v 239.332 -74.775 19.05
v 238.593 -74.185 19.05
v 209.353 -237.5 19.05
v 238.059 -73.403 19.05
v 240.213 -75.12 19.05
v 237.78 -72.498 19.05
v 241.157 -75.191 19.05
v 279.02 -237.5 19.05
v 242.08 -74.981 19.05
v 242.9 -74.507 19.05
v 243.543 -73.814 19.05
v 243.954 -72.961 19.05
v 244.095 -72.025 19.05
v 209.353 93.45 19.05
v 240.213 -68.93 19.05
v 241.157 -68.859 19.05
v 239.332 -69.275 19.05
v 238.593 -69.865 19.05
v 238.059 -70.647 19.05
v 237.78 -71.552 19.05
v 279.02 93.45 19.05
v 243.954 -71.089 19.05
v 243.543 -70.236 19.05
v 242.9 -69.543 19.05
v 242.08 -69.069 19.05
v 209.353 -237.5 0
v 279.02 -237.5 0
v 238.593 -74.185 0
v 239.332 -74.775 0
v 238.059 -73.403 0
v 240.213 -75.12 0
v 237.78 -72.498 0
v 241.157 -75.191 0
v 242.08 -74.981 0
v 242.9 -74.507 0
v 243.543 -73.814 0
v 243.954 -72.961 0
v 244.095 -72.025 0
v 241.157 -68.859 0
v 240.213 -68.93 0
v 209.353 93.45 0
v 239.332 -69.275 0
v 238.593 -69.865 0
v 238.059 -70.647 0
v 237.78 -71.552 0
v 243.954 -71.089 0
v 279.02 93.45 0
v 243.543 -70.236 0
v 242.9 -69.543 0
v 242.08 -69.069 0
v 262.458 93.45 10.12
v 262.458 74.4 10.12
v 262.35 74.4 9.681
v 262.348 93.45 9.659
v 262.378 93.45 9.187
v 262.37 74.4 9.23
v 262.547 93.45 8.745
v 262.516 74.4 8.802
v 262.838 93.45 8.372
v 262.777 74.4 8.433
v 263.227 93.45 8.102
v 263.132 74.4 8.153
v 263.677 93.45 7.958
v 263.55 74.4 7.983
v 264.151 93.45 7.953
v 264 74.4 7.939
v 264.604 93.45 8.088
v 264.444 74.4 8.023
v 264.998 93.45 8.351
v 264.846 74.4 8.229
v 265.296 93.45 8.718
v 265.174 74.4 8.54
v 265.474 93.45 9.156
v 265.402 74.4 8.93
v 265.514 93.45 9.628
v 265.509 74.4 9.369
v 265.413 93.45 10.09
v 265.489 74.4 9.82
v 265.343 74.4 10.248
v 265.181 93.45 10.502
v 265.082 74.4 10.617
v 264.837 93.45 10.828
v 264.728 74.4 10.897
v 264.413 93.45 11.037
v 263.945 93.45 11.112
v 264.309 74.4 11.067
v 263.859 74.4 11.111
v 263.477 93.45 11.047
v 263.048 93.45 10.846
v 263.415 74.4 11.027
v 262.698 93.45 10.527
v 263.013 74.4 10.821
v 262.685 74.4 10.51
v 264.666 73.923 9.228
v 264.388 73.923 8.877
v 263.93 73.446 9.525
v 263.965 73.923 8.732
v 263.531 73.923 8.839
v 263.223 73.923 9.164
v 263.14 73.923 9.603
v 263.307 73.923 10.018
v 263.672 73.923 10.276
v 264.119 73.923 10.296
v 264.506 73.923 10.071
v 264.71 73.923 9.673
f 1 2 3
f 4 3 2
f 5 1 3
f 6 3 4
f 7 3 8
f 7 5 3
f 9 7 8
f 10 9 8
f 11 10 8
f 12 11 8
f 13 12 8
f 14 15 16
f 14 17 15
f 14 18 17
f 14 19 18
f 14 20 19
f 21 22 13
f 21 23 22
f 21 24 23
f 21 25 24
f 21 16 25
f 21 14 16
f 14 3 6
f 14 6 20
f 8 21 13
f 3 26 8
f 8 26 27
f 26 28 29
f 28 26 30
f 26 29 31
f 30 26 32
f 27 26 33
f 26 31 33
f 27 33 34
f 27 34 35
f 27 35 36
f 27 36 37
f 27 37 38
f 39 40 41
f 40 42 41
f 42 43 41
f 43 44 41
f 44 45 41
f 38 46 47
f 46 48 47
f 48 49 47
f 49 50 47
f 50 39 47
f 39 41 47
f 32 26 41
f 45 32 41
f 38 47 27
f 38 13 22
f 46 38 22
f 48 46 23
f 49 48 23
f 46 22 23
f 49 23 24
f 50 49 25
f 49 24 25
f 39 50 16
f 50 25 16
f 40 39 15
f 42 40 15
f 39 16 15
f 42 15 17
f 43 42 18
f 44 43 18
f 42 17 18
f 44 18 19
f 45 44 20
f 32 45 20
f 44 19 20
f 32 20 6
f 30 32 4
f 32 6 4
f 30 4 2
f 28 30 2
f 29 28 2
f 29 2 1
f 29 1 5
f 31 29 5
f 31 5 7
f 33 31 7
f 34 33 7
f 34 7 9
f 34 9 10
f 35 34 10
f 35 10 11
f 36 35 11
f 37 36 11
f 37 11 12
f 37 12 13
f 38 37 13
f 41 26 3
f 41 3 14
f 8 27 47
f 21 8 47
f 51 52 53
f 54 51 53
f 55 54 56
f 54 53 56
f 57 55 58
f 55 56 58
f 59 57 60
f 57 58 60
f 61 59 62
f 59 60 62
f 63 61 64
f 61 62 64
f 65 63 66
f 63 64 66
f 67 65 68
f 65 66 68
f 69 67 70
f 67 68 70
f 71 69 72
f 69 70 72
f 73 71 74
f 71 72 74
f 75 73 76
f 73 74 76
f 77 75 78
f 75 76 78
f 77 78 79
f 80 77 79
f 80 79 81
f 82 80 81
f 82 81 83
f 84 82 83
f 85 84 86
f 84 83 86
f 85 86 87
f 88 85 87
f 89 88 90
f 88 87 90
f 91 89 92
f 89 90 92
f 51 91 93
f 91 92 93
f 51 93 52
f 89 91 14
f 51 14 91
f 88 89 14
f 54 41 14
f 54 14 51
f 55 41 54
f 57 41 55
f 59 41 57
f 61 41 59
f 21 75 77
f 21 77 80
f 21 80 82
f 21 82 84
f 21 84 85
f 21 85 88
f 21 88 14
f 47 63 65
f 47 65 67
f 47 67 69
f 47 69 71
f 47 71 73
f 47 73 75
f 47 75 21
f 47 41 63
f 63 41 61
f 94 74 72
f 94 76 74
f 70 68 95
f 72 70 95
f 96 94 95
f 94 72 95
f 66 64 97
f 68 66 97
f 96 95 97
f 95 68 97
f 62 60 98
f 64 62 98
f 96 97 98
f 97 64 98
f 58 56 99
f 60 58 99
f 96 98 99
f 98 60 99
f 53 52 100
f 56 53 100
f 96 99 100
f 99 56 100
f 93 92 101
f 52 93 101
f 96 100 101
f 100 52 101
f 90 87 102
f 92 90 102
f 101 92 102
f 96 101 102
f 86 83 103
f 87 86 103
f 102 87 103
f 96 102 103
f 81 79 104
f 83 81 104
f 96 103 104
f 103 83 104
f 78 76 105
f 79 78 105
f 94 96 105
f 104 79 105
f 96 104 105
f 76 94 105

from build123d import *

# Parameters (mm, degrees)
SKETCH1_W                   = 69.666978681
SKETCH1_H                   = 330.949999988
BOSS_EXTRUDE1_DEPTH         = 19.05
F_1_4_0_25_DIAMETER_HOLE1_D = 6.35
HOLE5_D                     = 3.175
HOLE5_DEPTH                 = 38.1
HOLE5_CSINK_D               = 10.16
HOLE5_CSINK_ANGLE           = 82
HOLE5_TIP                   = 0.953866233


with BuildPart() as part:
    # Sketch1 → Boss-Extrude1 (new body)
    with BuildSketch(Plane.XY):
        with Locations((244.186456522, -72.024999997)):
            Rectangle(SKETCH1_W, SKETCH1_H)
    extrude(amount=BOSS_EXTRUDE1_DEPTH)

    # 1/4 (0.25) Diameter Hole1 (through all)
    with Locations(Plane(origin=(0, 0, 0), x_dir=(-1, 0, 0), z_dir=(0, 0, -1))):
        with Locations((-240.919945862, -72.024999997)):
            Hole(F_1_4_0_25_DIAMETER_HOLE1_D / 2)

    # Hole5
    with Locations(Plane(origin=(-181.039434513, 112.499999997, 580.972905015), x_dir=(0.9271838545667913, -6.190403823971236e-15, -0.3746065934159023), z_dir=(0, 1, 0))):
        with Locations((77.689167439, 113.488854888), (70.865650555, 37.945520226), (443.755923515, 80.423559293), (438.7765707, 25.297013484), (549.651376608, 172.604565212), (567.144534626, 165.5368706), (580.227669901, 197.918766721), (644.129452085, 356.081227714), (562.734511883, 204.986461333), (626.636294067, 363.148922326)):
            CounterSinkHole(HOLE5_D / 2, HOLE5_CSINK_D / 2, depth=HOLE5_DEPTH, counter_sink_angle=HOLE5_CSINK_ANGLE)
            with Locations((0, 0, -(HOLE5_DEPTH + HOLE5_TIP / 2))):  # 118° drill point
                Cone(0, HOLE5_D / 2, HOLE5_TIP, mode=Mode.SUBTRACT)


solid = part.part
